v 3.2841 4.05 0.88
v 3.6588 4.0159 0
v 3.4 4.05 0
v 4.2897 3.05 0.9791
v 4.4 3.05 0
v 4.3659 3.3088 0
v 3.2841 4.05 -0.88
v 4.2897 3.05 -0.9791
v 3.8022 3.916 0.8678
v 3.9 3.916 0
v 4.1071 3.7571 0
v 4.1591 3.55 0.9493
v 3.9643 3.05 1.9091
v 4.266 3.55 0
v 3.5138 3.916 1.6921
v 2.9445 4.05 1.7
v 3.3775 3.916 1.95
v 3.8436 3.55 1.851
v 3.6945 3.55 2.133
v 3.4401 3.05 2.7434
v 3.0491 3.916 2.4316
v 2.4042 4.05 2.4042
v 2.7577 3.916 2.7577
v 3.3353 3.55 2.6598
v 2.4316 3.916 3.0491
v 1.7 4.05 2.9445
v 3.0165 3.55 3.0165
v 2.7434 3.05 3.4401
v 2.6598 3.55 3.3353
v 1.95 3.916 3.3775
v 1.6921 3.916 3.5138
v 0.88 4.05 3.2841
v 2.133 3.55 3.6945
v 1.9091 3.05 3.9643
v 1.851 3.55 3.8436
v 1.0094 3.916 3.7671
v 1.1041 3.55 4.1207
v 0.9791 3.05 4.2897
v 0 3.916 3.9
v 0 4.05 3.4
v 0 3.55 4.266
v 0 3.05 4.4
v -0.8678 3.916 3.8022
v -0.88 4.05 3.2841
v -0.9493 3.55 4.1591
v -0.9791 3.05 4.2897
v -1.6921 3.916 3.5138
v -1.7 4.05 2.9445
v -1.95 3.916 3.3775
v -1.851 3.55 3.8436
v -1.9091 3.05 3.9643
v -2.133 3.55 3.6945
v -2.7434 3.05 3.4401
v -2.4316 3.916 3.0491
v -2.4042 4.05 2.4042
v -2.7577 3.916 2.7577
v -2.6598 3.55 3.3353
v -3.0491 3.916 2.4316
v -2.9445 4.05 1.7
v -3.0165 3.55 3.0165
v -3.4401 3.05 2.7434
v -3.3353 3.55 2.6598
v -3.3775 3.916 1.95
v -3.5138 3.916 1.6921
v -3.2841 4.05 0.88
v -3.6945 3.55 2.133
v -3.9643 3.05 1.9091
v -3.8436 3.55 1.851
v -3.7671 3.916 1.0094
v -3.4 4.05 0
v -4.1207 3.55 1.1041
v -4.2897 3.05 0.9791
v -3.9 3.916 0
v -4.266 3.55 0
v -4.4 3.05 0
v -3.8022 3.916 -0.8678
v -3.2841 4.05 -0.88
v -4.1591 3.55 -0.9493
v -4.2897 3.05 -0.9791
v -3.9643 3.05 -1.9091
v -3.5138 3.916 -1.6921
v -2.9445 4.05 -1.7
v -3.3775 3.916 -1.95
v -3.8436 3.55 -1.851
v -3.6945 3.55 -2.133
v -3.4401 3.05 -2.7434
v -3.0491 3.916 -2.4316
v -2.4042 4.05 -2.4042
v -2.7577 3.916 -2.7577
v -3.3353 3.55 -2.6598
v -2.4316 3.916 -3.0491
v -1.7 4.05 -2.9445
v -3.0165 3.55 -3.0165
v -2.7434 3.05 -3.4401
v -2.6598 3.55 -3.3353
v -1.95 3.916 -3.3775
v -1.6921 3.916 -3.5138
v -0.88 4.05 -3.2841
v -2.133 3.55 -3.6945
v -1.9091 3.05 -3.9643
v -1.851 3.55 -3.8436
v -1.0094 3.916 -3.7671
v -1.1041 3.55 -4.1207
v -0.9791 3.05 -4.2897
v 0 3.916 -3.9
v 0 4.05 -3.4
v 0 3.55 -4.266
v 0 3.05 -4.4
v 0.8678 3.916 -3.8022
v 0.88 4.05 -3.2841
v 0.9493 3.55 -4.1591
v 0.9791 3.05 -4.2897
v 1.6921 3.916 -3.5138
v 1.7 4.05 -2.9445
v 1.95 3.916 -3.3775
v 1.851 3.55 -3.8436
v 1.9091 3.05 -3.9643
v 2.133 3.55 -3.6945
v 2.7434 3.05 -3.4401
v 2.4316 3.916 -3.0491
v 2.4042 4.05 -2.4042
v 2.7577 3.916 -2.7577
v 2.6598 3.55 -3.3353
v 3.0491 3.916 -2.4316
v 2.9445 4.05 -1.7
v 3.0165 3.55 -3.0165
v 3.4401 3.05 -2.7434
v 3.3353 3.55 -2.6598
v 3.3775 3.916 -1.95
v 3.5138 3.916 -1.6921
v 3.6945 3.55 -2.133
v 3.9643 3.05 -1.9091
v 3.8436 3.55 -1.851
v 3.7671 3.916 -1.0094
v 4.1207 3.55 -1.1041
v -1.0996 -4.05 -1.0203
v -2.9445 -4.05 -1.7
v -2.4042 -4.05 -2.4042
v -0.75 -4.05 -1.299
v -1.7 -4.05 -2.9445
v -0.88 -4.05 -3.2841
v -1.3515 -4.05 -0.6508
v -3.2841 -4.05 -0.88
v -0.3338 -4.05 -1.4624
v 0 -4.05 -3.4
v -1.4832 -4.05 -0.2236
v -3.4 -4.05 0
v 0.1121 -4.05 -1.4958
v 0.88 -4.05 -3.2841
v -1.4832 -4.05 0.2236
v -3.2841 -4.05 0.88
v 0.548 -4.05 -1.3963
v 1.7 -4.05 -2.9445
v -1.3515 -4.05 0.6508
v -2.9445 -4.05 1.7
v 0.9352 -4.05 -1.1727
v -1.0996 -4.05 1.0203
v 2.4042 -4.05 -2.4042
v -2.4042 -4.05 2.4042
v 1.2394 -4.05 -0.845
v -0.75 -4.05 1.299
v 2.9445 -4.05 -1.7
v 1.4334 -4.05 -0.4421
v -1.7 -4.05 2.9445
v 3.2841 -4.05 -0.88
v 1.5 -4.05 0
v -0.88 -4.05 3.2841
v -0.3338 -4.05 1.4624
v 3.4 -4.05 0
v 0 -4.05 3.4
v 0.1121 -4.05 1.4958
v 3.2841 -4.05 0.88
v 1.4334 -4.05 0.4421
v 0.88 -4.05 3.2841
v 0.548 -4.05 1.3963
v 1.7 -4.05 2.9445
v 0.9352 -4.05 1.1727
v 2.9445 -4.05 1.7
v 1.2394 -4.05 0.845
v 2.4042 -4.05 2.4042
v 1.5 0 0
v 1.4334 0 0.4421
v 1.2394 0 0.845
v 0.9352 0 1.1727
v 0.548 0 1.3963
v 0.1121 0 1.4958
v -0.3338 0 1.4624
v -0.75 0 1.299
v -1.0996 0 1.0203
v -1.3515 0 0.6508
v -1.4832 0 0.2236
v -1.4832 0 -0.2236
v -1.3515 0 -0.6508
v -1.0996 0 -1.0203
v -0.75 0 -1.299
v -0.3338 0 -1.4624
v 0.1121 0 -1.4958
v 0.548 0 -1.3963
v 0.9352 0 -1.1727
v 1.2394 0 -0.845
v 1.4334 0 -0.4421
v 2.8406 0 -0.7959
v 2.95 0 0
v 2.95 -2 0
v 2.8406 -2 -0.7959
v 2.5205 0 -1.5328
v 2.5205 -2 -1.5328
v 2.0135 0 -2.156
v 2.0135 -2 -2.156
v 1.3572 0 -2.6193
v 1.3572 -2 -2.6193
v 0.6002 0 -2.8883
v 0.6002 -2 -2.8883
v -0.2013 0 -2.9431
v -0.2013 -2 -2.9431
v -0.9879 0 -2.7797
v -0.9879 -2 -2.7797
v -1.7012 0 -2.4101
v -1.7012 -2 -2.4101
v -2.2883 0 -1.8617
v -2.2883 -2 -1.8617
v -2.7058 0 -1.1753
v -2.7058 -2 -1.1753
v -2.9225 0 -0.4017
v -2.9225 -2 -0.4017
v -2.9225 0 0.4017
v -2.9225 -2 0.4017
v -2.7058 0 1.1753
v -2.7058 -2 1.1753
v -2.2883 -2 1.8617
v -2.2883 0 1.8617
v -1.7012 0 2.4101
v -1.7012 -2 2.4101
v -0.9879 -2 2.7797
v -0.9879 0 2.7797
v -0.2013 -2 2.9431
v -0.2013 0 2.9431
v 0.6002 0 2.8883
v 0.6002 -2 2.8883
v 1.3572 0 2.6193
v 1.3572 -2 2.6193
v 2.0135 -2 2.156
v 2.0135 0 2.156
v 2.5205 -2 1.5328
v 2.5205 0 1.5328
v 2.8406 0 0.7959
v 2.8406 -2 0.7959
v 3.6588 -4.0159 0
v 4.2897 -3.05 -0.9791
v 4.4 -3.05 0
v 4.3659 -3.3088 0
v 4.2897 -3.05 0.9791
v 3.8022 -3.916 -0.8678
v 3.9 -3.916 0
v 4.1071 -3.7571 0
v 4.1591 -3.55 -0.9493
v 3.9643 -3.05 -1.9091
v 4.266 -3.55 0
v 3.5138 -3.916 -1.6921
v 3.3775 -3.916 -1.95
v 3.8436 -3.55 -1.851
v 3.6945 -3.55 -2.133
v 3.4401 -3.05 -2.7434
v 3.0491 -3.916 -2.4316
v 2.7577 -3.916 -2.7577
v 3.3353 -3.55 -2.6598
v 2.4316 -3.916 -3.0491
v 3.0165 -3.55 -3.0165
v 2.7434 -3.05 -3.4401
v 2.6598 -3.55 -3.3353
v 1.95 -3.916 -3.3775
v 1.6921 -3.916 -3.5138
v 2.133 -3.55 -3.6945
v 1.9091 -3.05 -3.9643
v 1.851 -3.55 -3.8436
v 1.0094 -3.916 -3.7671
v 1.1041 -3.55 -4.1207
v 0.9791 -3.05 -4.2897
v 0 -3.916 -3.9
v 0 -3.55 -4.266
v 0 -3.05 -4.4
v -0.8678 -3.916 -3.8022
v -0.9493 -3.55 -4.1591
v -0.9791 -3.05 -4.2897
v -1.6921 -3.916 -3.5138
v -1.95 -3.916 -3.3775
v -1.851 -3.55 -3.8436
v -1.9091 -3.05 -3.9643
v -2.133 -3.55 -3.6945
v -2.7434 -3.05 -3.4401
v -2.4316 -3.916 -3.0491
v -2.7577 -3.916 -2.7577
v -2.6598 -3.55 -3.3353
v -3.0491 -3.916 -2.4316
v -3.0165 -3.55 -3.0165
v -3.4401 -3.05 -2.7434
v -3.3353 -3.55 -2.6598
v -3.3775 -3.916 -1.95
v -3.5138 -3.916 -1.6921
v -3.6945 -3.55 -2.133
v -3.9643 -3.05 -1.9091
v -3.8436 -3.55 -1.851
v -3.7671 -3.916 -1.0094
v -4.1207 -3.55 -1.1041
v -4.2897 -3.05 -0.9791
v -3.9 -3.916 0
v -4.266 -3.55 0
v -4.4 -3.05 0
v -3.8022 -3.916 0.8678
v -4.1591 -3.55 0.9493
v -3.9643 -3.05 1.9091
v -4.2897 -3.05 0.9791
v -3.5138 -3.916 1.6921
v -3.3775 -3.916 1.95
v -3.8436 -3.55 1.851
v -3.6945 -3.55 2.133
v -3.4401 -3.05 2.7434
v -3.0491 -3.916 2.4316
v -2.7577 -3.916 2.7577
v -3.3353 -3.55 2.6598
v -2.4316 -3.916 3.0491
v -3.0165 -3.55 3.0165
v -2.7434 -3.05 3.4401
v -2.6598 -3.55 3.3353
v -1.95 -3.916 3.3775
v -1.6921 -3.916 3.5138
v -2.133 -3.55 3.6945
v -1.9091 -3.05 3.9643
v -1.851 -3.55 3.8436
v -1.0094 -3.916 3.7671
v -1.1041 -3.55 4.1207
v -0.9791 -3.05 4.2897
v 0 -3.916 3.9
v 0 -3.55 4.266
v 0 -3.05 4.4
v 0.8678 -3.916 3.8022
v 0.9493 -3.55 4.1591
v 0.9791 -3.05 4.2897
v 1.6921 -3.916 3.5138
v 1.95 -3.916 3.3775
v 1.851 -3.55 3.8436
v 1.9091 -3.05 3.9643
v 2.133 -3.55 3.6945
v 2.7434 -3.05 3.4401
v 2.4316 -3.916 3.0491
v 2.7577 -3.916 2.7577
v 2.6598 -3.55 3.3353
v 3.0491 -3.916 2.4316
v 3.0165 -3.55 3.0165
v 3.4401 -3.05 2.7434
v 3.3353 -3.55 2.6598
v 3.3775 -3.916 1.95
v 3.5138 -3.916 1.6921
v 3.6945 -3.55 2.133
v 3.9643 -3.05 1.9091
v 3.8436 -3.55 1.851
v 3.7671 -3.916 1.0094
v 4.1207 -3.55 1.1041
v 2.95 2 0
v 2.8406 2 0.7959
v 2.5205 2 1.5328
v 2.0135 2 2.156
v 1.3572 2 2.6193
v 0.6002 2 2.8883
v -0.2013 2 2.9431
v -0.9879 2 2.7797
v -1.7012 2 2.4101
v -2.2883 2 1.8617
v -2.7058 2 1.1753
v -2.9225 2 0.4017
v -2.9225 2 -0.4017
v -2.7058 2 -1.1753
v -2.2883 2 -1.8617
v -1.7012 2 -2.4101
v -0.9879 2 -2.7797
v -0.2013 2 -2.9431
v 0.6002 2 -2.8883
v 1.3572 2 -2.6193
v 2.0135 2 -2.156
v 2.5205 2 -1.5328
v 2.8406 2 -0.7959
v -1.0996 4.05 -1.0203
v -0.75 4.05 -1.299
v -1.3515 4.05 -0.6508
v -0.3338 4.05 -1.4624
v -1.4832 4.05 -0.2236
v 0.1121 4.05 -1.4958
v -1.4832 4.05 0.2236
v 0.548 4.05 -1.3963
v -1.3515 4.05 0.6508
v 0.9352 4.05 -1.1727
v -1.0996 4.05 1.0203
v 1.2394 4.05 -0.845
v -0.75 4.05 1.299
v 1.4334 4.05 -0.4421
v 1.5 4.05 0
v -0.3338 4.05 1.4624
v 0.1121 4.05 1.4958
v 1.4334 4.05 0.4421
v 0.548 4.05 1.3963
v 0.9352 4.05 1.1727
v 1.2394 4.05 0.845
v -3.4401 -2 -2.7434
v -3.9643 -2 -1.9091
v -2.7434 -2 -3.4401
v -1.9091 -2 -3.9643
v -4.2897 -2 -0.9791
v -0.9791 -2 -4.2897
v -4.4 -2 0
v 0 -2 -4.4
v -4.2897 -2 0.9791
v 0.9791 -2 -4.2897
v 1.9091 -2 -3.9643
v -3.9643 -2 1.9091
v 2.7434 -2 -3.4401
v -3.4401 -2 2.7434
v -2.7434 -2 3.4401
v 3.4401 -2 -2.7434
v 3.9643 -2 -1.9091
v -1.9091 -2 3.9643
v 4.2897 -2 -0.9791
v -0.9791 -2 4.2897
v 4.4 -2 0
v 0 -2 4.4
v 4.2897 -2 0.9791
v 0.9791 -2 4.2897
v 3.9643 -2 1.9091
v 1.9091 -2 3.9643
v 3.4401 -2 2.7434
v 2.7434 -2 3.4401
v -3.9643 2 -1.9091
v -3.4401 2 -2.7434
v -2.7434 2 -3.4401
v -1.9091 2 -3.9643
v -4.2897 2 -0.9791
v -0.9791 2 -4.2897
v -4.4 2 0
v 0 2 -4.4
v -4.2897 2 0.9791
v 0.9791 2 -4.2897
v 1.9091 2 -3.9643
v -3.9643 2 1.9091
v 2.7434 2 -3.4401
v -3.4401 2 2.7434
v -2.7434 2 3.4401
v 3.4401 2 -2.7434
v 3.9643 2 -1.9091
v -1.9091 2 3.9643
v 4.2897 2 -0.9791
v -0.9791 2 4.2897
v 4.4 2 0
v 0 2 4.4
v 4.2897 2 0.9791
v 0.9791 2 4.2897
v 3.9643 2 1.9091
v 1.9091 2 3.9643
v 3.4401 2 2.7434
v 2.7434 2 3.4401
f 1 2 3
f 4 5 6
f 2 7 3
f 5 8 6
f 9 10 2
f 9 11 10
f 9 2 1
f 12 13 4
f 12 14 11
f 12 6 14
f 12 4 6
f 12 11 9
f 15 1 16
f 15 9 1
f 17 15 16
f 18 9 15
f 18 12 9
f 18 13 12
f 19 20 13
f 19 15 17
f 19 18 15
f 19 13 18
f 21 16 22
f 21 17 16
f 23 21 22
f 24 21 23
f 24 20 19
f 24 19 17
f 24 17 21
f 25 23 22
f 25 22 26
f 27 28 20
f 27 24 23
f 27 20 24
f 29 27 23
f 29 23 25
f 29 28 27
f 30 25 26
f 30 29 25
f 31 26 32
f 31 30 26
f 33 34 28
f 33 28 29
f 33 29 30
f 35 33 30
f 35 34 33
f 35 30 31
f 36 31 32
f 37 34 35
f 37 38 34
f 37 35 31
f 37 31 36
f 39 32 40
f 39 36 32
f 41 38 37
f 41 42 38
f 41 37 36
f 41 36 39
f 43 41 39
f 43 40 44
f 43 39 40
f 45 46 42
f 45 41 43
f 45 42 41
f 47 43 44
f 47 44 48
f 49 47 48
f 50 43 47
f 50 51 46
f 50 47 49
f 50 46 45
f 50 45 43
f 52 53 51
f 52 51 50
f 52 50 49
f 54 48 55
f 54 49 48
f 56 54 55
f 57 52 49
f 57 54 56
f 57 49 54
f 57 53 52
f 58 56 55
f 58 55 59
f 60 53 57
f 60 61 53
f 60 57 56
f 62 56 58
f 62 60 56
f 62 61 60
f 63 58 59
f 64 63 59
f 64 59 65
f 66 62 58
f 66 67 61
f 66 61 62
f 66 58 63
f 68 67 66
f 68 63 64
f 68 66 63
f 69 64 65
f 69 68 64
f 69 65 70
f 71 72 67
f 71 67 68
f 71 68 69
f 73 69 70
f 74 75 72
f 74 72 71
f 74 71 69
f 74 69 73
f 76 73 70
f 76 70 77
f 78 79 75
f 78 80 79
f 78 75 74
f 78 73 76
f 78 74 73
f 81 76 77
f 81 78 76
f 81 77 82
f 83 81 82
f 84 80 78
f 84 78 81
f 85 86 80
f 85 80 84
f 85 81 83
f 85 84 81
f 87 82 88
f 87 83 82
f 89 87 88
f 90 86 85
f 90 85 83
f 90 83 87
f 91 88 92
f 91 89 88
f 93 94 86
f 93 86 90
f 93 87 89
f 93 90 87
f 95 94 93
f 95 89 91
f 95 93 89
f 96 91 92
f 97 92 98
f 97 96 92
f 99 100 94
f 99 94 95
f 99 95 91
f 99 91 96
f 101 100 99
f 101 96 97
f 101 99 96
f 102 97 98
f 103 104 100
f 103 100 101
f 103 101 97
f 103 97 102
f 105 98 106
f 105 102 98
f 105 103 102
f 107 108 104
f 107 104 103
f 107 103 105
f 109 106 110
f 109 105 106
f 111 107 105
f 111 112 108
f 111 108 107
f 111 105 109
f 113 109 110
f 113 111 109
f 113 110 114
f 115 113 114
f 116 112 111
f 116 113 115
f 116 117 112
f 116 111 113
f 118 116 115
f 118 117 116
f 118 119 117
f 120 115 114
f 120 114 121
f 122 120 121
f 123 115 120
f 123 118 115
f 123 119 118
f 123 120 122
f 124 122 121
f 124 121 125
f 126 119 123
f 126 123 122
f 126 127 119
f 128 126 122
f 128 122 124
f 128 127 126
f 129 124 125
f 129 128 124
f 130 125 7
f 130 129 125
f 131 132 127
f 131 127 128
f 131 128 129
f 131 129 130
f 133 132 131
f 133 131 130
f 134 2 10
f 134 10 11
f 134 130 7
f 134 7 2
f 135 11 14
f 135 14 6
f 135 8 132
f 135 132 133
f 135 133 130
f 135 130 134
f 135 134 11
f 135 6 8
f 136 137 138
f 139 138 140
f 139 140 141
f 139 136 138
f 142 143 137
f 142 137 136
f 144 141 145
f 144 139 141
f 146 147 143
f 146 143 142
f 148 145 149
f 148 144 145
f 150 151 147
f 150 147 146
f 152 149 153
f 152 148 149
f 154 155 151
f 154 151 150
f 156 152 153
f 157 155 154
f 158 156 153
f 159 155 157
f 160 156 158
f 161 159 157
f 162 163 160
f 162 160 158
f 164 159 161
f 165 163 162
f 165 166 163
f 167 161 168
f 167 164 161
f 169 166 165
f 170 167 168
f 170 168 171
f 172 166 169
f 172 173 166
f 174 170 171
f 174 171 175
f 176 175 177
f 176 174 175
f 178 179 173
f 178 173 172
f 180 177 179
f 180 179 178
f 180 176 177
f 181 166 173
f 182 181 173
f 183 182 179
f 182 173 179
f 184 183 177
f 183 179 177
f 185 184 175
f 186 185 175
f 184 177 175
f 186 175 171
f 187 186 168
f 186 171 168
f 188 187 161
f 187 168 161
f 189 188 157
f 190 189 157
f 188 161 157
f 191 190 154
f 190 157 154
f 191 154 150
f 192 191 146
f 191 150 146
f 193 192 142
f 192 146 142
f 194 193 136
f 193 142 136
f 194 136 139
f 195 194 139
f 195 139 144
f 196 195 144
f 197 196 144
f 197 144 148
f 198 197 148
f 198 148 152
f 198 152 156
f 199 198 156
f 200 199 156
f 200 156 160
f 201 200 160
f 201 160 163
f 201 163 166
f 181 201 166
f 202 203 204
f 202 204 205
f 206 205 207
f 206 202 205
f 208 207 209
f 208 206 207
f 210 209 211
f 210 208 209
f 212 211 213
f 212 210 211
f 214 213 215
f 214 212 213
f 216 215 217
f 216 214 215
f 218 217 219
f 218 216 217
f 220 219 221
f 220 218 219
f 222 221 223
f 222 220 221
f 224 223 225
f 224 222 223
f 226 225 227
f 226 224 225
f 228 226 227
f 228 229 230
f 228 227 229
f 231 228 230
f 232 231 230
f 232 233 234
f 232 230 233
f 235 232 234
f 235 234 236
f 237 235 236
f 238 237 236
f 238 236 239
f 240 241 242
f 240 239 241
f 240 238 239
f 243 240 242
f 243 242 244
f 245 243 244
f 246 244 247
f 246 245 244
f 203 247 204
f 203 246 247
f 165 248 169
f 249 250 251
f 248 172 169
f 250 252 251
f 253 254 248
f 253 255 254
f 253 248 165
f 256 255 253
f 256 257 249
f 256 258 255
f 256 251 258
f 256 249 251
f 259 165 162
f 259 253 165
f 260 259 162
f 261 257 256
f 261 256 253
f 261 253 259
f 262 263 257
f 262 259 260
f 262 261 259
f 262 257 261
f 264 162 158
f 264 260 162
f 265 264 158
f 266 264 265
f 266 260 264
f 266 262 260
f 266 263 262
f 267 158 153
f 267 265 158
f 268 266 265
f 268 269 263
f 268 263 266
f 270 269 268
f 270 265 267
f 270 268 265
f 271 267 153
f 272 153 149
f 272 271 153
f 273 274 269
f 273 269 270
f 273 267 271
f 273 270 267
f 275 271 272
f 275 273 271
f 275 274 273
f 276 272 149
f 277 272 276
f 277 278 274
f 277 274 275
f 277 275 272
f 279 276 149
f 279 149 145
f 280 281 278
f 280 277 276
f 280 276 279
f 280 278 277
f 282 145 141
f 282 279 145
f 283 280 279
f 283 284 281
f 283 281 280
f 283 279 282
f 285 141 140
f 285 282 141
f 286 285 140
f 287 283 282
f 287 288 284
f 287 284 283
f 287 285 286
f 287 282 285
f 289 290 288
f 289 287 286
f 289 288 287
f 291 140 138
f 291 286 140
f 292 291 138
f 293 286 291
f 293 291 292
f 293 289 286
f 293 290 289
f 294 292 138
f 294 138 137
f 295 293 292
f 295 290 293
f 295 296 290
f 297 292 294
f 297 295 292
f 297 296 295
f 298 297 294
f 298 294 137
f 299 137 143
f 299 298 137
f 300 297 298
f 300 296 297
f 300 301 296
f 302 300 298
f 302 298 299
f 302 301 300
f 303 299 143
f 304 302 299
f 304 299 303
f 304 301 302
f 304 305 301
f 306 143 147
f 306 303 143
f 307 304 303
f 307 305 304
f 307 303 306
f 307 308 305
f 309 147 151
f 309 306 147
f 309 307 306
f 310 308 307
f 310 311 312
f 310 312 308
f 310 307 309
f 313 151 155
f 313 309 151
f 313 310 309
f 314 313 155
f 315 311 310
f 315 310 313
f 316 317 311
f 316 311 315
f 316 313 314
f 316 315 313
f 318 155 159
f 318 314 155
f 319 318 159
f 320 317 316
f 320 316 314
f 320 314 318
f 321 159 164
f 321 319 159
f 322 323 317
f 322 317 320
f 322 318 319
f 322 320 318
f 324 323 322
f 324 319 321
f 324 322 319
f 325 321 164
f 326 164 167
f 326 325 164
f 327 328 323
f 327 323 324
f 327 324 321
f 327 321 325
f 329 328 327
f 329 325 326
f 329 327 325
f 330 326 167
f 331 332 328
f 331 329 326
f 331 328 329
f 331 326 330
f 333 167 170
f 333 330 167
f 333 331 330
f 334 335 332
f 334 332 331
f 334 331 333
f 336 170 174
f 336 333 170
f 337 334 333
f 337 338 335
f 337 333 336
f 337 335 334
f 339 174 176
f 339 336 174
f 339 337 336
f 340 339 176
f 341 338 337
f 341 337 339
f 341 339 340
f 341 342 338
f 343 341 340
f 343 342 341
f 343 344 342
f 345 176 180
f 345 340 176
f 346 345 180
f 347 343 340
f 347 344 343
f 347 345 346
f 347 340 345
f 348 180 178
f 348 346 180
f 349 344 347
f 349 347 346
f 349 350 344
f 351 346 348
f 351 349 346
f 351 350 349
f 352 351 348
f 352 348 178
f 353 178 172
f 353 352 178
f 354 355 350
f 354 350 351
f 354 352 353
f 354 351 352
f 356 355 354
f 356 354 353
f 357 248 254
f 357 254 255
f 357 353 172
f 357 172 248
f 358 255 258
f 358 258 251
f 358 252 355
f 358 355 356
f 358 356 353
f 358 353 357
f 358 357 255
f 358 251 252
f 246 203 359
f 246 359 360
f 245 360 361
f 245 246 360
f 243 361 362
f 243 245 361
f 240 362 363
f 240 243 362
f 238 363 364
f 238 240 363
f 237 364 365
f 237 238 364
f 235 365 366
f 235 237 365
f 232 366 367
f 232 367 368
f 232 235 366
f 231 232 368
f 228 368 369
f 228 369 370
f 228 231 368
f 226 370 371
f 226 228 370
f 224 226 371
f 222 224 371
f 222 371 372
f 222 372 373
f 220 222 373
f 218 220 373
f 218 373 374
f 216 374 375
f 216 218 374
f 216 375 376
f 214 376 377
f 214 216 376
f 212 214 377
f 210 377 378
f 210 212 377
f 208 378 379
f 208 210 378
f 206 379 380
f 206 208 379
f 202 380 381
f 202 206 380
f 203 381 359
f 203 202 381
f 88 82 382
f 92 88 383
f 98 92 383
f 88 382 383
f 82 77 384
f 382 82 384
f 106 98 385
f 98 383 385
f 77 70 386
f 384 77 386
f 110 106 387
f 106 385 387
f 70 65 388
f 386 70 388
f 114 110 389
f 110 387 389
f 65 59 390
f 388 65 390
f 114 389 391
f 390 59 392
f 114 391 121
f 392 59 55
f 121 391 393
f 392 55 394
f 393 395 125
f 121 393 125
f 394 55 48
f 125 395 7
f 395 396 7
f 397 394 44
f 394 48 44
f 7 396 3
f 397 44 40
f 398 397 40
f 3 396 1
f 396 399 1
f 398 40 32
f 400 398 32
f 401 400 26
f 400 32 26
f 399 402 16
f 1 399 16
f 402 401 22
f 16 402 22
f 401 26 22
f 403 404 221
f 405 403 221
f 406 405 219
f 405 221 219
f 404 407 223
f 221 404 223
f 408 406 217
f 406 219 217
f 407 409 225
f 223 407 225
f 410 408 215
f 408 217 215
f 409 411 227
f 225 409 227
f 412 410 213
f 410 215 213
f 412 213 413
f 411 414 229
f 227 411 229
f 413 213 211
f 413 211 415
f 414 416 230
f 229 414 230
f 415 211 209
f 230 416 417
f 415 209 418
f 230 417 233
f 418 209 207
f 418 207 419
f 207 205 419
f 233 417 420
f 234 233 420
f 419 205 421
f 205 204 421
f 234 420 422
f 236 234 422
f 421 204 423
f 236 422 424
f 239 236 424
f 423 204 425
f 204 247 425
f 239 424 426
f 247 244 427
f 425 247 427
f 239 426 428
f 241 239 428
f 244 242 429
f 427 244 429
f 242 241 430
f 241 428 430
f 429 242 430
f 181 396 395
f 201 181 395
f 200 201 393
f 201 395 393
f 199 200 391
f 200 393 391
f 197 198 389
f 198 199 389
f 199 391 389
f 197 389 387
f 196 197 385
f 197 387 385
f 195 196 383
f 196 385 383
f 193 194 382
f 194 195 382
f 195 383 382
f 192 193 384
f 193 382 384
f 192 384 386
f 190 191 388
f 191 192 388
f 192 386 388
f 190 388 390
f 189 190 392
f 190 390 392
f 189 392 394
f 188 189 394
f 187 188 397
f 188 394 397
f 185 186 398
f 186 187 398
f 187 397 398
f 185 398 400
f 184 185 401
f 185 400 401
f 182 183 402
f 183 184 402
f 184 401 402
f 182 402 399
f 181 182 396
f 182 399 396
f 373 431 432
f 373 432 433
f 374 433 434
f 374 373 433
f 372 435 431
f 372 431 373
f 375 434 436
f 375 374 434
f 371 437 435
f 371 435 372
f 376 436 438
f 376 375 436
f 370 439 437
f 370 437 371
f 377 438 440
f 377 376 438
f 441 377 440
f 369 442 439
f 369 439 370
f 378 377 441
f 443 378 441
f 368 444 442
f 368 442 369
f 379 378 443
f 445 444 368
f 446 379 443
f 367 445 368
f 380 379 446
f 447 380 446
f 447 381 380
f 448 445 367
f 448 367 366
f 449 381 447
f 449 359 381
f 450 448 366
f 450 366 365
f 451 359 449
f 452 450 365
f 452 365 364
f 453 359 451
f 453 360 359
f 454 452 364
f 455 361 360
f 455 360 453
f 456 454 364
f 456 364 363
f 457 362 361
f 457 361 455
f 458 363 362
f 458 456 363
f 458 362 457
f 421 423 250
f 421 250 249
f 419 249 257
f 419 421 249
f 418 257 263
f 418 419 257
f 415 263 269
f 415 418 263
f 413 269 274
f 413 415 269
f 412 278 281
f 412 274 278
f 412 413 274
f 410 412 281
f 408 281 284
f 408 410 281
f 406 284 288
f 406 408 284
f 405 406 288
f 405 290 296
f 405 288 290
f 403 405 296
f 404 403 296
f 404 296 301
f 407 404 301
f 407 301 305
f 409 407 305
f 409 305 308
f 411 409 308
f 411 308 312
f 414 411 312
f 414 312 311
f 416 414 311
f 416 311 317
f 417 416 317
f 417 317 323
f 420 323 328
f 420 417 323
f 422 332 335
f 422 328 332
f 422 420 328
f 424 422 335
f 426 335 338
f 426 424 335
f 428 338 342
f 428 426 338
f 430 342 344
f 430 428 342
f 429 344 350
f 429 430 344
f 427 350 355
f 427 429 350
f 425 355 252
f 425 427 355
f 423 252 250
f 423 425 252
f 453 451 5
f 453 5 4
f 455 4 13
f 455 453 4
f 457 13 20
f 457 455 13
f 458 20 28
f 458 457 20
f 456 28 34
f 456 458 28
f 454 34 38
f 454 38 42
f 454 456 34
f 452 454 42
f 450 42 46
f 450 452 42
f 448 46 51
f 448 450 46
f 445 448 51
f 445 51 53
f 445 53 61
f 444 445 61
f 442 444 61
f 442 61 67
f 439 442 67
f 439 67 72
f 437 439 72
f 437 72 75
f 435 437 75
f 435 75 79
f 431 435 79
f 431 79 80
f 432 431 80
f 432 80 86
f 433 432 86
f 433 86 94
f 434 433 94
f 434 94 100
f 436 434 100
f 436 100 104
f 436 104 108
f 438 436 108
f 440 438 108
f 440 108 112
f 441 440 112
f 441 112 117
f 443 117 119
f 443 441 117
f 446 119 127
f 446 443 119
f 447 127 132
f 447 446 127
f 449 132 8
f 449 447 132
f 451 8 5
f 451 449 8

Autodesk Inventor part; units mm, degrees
ref_plane "YZ Plane" through (0, 0, 0) normal (1, 0, 0) x (0, 1, 0)
ref_plane "XZ Plane" through (0, 0, 0) normal (0, 1, 0) x (-1, 0, 0)
ref_plane "XY Plane" through (0, 0, 0) normal (0, 0, 1) x (1, 0, 0)
sketch "Sketch1" plane through (0, 0, 0) normal (0, 0, 1) x (1, 0, 0)
  line L0 (1.5, 0) -> (1.5, 4.05)
  line L1 (1.5, 4.05) -> (4.4, 4.05)
  line L2 (4.4, 4.05) -> (4.4, 2)
  line L3 (4.4, 2) -> (2.95, 2)
  line L4 (2.95, 2) -> (2.95, 0)
  line L5 (0, 0) -> (18.7234, 0) construction
  line L6 (0, 16.7698) -> (0, -15.2532)
  line L7 (1.5, 0) -> (1.5, -4.05)
  line L8 (1.5, -4.05) -> (4.4, -4.05)
  line L9 (4.4, -4.05) -> (4.4, -2)
  line L10 (4.4, -2) -> (2.95, -2)
  line L11 (2.95, -2) -> (2.95, 0)
  dimension "d1" = 0
  dimension "d3" = 3
  dimension "d4" = 5.9
  dimension "d5" = 8.8
  dimension "d6" = 8.1
  dimension "d7" = 4
revolve "Revolution1" add sketch "Sketch1" angle 360 about axis through (0, 16.7698, 0) along (0, -1, 0)
fillet "Fillet1" radius 1 1 edges at (-4.4, 4.05, 0)
fillet "Fillet2" radius 1 1 edges at (-4.4, -4.05, 0)
properties part number "Grommet"
